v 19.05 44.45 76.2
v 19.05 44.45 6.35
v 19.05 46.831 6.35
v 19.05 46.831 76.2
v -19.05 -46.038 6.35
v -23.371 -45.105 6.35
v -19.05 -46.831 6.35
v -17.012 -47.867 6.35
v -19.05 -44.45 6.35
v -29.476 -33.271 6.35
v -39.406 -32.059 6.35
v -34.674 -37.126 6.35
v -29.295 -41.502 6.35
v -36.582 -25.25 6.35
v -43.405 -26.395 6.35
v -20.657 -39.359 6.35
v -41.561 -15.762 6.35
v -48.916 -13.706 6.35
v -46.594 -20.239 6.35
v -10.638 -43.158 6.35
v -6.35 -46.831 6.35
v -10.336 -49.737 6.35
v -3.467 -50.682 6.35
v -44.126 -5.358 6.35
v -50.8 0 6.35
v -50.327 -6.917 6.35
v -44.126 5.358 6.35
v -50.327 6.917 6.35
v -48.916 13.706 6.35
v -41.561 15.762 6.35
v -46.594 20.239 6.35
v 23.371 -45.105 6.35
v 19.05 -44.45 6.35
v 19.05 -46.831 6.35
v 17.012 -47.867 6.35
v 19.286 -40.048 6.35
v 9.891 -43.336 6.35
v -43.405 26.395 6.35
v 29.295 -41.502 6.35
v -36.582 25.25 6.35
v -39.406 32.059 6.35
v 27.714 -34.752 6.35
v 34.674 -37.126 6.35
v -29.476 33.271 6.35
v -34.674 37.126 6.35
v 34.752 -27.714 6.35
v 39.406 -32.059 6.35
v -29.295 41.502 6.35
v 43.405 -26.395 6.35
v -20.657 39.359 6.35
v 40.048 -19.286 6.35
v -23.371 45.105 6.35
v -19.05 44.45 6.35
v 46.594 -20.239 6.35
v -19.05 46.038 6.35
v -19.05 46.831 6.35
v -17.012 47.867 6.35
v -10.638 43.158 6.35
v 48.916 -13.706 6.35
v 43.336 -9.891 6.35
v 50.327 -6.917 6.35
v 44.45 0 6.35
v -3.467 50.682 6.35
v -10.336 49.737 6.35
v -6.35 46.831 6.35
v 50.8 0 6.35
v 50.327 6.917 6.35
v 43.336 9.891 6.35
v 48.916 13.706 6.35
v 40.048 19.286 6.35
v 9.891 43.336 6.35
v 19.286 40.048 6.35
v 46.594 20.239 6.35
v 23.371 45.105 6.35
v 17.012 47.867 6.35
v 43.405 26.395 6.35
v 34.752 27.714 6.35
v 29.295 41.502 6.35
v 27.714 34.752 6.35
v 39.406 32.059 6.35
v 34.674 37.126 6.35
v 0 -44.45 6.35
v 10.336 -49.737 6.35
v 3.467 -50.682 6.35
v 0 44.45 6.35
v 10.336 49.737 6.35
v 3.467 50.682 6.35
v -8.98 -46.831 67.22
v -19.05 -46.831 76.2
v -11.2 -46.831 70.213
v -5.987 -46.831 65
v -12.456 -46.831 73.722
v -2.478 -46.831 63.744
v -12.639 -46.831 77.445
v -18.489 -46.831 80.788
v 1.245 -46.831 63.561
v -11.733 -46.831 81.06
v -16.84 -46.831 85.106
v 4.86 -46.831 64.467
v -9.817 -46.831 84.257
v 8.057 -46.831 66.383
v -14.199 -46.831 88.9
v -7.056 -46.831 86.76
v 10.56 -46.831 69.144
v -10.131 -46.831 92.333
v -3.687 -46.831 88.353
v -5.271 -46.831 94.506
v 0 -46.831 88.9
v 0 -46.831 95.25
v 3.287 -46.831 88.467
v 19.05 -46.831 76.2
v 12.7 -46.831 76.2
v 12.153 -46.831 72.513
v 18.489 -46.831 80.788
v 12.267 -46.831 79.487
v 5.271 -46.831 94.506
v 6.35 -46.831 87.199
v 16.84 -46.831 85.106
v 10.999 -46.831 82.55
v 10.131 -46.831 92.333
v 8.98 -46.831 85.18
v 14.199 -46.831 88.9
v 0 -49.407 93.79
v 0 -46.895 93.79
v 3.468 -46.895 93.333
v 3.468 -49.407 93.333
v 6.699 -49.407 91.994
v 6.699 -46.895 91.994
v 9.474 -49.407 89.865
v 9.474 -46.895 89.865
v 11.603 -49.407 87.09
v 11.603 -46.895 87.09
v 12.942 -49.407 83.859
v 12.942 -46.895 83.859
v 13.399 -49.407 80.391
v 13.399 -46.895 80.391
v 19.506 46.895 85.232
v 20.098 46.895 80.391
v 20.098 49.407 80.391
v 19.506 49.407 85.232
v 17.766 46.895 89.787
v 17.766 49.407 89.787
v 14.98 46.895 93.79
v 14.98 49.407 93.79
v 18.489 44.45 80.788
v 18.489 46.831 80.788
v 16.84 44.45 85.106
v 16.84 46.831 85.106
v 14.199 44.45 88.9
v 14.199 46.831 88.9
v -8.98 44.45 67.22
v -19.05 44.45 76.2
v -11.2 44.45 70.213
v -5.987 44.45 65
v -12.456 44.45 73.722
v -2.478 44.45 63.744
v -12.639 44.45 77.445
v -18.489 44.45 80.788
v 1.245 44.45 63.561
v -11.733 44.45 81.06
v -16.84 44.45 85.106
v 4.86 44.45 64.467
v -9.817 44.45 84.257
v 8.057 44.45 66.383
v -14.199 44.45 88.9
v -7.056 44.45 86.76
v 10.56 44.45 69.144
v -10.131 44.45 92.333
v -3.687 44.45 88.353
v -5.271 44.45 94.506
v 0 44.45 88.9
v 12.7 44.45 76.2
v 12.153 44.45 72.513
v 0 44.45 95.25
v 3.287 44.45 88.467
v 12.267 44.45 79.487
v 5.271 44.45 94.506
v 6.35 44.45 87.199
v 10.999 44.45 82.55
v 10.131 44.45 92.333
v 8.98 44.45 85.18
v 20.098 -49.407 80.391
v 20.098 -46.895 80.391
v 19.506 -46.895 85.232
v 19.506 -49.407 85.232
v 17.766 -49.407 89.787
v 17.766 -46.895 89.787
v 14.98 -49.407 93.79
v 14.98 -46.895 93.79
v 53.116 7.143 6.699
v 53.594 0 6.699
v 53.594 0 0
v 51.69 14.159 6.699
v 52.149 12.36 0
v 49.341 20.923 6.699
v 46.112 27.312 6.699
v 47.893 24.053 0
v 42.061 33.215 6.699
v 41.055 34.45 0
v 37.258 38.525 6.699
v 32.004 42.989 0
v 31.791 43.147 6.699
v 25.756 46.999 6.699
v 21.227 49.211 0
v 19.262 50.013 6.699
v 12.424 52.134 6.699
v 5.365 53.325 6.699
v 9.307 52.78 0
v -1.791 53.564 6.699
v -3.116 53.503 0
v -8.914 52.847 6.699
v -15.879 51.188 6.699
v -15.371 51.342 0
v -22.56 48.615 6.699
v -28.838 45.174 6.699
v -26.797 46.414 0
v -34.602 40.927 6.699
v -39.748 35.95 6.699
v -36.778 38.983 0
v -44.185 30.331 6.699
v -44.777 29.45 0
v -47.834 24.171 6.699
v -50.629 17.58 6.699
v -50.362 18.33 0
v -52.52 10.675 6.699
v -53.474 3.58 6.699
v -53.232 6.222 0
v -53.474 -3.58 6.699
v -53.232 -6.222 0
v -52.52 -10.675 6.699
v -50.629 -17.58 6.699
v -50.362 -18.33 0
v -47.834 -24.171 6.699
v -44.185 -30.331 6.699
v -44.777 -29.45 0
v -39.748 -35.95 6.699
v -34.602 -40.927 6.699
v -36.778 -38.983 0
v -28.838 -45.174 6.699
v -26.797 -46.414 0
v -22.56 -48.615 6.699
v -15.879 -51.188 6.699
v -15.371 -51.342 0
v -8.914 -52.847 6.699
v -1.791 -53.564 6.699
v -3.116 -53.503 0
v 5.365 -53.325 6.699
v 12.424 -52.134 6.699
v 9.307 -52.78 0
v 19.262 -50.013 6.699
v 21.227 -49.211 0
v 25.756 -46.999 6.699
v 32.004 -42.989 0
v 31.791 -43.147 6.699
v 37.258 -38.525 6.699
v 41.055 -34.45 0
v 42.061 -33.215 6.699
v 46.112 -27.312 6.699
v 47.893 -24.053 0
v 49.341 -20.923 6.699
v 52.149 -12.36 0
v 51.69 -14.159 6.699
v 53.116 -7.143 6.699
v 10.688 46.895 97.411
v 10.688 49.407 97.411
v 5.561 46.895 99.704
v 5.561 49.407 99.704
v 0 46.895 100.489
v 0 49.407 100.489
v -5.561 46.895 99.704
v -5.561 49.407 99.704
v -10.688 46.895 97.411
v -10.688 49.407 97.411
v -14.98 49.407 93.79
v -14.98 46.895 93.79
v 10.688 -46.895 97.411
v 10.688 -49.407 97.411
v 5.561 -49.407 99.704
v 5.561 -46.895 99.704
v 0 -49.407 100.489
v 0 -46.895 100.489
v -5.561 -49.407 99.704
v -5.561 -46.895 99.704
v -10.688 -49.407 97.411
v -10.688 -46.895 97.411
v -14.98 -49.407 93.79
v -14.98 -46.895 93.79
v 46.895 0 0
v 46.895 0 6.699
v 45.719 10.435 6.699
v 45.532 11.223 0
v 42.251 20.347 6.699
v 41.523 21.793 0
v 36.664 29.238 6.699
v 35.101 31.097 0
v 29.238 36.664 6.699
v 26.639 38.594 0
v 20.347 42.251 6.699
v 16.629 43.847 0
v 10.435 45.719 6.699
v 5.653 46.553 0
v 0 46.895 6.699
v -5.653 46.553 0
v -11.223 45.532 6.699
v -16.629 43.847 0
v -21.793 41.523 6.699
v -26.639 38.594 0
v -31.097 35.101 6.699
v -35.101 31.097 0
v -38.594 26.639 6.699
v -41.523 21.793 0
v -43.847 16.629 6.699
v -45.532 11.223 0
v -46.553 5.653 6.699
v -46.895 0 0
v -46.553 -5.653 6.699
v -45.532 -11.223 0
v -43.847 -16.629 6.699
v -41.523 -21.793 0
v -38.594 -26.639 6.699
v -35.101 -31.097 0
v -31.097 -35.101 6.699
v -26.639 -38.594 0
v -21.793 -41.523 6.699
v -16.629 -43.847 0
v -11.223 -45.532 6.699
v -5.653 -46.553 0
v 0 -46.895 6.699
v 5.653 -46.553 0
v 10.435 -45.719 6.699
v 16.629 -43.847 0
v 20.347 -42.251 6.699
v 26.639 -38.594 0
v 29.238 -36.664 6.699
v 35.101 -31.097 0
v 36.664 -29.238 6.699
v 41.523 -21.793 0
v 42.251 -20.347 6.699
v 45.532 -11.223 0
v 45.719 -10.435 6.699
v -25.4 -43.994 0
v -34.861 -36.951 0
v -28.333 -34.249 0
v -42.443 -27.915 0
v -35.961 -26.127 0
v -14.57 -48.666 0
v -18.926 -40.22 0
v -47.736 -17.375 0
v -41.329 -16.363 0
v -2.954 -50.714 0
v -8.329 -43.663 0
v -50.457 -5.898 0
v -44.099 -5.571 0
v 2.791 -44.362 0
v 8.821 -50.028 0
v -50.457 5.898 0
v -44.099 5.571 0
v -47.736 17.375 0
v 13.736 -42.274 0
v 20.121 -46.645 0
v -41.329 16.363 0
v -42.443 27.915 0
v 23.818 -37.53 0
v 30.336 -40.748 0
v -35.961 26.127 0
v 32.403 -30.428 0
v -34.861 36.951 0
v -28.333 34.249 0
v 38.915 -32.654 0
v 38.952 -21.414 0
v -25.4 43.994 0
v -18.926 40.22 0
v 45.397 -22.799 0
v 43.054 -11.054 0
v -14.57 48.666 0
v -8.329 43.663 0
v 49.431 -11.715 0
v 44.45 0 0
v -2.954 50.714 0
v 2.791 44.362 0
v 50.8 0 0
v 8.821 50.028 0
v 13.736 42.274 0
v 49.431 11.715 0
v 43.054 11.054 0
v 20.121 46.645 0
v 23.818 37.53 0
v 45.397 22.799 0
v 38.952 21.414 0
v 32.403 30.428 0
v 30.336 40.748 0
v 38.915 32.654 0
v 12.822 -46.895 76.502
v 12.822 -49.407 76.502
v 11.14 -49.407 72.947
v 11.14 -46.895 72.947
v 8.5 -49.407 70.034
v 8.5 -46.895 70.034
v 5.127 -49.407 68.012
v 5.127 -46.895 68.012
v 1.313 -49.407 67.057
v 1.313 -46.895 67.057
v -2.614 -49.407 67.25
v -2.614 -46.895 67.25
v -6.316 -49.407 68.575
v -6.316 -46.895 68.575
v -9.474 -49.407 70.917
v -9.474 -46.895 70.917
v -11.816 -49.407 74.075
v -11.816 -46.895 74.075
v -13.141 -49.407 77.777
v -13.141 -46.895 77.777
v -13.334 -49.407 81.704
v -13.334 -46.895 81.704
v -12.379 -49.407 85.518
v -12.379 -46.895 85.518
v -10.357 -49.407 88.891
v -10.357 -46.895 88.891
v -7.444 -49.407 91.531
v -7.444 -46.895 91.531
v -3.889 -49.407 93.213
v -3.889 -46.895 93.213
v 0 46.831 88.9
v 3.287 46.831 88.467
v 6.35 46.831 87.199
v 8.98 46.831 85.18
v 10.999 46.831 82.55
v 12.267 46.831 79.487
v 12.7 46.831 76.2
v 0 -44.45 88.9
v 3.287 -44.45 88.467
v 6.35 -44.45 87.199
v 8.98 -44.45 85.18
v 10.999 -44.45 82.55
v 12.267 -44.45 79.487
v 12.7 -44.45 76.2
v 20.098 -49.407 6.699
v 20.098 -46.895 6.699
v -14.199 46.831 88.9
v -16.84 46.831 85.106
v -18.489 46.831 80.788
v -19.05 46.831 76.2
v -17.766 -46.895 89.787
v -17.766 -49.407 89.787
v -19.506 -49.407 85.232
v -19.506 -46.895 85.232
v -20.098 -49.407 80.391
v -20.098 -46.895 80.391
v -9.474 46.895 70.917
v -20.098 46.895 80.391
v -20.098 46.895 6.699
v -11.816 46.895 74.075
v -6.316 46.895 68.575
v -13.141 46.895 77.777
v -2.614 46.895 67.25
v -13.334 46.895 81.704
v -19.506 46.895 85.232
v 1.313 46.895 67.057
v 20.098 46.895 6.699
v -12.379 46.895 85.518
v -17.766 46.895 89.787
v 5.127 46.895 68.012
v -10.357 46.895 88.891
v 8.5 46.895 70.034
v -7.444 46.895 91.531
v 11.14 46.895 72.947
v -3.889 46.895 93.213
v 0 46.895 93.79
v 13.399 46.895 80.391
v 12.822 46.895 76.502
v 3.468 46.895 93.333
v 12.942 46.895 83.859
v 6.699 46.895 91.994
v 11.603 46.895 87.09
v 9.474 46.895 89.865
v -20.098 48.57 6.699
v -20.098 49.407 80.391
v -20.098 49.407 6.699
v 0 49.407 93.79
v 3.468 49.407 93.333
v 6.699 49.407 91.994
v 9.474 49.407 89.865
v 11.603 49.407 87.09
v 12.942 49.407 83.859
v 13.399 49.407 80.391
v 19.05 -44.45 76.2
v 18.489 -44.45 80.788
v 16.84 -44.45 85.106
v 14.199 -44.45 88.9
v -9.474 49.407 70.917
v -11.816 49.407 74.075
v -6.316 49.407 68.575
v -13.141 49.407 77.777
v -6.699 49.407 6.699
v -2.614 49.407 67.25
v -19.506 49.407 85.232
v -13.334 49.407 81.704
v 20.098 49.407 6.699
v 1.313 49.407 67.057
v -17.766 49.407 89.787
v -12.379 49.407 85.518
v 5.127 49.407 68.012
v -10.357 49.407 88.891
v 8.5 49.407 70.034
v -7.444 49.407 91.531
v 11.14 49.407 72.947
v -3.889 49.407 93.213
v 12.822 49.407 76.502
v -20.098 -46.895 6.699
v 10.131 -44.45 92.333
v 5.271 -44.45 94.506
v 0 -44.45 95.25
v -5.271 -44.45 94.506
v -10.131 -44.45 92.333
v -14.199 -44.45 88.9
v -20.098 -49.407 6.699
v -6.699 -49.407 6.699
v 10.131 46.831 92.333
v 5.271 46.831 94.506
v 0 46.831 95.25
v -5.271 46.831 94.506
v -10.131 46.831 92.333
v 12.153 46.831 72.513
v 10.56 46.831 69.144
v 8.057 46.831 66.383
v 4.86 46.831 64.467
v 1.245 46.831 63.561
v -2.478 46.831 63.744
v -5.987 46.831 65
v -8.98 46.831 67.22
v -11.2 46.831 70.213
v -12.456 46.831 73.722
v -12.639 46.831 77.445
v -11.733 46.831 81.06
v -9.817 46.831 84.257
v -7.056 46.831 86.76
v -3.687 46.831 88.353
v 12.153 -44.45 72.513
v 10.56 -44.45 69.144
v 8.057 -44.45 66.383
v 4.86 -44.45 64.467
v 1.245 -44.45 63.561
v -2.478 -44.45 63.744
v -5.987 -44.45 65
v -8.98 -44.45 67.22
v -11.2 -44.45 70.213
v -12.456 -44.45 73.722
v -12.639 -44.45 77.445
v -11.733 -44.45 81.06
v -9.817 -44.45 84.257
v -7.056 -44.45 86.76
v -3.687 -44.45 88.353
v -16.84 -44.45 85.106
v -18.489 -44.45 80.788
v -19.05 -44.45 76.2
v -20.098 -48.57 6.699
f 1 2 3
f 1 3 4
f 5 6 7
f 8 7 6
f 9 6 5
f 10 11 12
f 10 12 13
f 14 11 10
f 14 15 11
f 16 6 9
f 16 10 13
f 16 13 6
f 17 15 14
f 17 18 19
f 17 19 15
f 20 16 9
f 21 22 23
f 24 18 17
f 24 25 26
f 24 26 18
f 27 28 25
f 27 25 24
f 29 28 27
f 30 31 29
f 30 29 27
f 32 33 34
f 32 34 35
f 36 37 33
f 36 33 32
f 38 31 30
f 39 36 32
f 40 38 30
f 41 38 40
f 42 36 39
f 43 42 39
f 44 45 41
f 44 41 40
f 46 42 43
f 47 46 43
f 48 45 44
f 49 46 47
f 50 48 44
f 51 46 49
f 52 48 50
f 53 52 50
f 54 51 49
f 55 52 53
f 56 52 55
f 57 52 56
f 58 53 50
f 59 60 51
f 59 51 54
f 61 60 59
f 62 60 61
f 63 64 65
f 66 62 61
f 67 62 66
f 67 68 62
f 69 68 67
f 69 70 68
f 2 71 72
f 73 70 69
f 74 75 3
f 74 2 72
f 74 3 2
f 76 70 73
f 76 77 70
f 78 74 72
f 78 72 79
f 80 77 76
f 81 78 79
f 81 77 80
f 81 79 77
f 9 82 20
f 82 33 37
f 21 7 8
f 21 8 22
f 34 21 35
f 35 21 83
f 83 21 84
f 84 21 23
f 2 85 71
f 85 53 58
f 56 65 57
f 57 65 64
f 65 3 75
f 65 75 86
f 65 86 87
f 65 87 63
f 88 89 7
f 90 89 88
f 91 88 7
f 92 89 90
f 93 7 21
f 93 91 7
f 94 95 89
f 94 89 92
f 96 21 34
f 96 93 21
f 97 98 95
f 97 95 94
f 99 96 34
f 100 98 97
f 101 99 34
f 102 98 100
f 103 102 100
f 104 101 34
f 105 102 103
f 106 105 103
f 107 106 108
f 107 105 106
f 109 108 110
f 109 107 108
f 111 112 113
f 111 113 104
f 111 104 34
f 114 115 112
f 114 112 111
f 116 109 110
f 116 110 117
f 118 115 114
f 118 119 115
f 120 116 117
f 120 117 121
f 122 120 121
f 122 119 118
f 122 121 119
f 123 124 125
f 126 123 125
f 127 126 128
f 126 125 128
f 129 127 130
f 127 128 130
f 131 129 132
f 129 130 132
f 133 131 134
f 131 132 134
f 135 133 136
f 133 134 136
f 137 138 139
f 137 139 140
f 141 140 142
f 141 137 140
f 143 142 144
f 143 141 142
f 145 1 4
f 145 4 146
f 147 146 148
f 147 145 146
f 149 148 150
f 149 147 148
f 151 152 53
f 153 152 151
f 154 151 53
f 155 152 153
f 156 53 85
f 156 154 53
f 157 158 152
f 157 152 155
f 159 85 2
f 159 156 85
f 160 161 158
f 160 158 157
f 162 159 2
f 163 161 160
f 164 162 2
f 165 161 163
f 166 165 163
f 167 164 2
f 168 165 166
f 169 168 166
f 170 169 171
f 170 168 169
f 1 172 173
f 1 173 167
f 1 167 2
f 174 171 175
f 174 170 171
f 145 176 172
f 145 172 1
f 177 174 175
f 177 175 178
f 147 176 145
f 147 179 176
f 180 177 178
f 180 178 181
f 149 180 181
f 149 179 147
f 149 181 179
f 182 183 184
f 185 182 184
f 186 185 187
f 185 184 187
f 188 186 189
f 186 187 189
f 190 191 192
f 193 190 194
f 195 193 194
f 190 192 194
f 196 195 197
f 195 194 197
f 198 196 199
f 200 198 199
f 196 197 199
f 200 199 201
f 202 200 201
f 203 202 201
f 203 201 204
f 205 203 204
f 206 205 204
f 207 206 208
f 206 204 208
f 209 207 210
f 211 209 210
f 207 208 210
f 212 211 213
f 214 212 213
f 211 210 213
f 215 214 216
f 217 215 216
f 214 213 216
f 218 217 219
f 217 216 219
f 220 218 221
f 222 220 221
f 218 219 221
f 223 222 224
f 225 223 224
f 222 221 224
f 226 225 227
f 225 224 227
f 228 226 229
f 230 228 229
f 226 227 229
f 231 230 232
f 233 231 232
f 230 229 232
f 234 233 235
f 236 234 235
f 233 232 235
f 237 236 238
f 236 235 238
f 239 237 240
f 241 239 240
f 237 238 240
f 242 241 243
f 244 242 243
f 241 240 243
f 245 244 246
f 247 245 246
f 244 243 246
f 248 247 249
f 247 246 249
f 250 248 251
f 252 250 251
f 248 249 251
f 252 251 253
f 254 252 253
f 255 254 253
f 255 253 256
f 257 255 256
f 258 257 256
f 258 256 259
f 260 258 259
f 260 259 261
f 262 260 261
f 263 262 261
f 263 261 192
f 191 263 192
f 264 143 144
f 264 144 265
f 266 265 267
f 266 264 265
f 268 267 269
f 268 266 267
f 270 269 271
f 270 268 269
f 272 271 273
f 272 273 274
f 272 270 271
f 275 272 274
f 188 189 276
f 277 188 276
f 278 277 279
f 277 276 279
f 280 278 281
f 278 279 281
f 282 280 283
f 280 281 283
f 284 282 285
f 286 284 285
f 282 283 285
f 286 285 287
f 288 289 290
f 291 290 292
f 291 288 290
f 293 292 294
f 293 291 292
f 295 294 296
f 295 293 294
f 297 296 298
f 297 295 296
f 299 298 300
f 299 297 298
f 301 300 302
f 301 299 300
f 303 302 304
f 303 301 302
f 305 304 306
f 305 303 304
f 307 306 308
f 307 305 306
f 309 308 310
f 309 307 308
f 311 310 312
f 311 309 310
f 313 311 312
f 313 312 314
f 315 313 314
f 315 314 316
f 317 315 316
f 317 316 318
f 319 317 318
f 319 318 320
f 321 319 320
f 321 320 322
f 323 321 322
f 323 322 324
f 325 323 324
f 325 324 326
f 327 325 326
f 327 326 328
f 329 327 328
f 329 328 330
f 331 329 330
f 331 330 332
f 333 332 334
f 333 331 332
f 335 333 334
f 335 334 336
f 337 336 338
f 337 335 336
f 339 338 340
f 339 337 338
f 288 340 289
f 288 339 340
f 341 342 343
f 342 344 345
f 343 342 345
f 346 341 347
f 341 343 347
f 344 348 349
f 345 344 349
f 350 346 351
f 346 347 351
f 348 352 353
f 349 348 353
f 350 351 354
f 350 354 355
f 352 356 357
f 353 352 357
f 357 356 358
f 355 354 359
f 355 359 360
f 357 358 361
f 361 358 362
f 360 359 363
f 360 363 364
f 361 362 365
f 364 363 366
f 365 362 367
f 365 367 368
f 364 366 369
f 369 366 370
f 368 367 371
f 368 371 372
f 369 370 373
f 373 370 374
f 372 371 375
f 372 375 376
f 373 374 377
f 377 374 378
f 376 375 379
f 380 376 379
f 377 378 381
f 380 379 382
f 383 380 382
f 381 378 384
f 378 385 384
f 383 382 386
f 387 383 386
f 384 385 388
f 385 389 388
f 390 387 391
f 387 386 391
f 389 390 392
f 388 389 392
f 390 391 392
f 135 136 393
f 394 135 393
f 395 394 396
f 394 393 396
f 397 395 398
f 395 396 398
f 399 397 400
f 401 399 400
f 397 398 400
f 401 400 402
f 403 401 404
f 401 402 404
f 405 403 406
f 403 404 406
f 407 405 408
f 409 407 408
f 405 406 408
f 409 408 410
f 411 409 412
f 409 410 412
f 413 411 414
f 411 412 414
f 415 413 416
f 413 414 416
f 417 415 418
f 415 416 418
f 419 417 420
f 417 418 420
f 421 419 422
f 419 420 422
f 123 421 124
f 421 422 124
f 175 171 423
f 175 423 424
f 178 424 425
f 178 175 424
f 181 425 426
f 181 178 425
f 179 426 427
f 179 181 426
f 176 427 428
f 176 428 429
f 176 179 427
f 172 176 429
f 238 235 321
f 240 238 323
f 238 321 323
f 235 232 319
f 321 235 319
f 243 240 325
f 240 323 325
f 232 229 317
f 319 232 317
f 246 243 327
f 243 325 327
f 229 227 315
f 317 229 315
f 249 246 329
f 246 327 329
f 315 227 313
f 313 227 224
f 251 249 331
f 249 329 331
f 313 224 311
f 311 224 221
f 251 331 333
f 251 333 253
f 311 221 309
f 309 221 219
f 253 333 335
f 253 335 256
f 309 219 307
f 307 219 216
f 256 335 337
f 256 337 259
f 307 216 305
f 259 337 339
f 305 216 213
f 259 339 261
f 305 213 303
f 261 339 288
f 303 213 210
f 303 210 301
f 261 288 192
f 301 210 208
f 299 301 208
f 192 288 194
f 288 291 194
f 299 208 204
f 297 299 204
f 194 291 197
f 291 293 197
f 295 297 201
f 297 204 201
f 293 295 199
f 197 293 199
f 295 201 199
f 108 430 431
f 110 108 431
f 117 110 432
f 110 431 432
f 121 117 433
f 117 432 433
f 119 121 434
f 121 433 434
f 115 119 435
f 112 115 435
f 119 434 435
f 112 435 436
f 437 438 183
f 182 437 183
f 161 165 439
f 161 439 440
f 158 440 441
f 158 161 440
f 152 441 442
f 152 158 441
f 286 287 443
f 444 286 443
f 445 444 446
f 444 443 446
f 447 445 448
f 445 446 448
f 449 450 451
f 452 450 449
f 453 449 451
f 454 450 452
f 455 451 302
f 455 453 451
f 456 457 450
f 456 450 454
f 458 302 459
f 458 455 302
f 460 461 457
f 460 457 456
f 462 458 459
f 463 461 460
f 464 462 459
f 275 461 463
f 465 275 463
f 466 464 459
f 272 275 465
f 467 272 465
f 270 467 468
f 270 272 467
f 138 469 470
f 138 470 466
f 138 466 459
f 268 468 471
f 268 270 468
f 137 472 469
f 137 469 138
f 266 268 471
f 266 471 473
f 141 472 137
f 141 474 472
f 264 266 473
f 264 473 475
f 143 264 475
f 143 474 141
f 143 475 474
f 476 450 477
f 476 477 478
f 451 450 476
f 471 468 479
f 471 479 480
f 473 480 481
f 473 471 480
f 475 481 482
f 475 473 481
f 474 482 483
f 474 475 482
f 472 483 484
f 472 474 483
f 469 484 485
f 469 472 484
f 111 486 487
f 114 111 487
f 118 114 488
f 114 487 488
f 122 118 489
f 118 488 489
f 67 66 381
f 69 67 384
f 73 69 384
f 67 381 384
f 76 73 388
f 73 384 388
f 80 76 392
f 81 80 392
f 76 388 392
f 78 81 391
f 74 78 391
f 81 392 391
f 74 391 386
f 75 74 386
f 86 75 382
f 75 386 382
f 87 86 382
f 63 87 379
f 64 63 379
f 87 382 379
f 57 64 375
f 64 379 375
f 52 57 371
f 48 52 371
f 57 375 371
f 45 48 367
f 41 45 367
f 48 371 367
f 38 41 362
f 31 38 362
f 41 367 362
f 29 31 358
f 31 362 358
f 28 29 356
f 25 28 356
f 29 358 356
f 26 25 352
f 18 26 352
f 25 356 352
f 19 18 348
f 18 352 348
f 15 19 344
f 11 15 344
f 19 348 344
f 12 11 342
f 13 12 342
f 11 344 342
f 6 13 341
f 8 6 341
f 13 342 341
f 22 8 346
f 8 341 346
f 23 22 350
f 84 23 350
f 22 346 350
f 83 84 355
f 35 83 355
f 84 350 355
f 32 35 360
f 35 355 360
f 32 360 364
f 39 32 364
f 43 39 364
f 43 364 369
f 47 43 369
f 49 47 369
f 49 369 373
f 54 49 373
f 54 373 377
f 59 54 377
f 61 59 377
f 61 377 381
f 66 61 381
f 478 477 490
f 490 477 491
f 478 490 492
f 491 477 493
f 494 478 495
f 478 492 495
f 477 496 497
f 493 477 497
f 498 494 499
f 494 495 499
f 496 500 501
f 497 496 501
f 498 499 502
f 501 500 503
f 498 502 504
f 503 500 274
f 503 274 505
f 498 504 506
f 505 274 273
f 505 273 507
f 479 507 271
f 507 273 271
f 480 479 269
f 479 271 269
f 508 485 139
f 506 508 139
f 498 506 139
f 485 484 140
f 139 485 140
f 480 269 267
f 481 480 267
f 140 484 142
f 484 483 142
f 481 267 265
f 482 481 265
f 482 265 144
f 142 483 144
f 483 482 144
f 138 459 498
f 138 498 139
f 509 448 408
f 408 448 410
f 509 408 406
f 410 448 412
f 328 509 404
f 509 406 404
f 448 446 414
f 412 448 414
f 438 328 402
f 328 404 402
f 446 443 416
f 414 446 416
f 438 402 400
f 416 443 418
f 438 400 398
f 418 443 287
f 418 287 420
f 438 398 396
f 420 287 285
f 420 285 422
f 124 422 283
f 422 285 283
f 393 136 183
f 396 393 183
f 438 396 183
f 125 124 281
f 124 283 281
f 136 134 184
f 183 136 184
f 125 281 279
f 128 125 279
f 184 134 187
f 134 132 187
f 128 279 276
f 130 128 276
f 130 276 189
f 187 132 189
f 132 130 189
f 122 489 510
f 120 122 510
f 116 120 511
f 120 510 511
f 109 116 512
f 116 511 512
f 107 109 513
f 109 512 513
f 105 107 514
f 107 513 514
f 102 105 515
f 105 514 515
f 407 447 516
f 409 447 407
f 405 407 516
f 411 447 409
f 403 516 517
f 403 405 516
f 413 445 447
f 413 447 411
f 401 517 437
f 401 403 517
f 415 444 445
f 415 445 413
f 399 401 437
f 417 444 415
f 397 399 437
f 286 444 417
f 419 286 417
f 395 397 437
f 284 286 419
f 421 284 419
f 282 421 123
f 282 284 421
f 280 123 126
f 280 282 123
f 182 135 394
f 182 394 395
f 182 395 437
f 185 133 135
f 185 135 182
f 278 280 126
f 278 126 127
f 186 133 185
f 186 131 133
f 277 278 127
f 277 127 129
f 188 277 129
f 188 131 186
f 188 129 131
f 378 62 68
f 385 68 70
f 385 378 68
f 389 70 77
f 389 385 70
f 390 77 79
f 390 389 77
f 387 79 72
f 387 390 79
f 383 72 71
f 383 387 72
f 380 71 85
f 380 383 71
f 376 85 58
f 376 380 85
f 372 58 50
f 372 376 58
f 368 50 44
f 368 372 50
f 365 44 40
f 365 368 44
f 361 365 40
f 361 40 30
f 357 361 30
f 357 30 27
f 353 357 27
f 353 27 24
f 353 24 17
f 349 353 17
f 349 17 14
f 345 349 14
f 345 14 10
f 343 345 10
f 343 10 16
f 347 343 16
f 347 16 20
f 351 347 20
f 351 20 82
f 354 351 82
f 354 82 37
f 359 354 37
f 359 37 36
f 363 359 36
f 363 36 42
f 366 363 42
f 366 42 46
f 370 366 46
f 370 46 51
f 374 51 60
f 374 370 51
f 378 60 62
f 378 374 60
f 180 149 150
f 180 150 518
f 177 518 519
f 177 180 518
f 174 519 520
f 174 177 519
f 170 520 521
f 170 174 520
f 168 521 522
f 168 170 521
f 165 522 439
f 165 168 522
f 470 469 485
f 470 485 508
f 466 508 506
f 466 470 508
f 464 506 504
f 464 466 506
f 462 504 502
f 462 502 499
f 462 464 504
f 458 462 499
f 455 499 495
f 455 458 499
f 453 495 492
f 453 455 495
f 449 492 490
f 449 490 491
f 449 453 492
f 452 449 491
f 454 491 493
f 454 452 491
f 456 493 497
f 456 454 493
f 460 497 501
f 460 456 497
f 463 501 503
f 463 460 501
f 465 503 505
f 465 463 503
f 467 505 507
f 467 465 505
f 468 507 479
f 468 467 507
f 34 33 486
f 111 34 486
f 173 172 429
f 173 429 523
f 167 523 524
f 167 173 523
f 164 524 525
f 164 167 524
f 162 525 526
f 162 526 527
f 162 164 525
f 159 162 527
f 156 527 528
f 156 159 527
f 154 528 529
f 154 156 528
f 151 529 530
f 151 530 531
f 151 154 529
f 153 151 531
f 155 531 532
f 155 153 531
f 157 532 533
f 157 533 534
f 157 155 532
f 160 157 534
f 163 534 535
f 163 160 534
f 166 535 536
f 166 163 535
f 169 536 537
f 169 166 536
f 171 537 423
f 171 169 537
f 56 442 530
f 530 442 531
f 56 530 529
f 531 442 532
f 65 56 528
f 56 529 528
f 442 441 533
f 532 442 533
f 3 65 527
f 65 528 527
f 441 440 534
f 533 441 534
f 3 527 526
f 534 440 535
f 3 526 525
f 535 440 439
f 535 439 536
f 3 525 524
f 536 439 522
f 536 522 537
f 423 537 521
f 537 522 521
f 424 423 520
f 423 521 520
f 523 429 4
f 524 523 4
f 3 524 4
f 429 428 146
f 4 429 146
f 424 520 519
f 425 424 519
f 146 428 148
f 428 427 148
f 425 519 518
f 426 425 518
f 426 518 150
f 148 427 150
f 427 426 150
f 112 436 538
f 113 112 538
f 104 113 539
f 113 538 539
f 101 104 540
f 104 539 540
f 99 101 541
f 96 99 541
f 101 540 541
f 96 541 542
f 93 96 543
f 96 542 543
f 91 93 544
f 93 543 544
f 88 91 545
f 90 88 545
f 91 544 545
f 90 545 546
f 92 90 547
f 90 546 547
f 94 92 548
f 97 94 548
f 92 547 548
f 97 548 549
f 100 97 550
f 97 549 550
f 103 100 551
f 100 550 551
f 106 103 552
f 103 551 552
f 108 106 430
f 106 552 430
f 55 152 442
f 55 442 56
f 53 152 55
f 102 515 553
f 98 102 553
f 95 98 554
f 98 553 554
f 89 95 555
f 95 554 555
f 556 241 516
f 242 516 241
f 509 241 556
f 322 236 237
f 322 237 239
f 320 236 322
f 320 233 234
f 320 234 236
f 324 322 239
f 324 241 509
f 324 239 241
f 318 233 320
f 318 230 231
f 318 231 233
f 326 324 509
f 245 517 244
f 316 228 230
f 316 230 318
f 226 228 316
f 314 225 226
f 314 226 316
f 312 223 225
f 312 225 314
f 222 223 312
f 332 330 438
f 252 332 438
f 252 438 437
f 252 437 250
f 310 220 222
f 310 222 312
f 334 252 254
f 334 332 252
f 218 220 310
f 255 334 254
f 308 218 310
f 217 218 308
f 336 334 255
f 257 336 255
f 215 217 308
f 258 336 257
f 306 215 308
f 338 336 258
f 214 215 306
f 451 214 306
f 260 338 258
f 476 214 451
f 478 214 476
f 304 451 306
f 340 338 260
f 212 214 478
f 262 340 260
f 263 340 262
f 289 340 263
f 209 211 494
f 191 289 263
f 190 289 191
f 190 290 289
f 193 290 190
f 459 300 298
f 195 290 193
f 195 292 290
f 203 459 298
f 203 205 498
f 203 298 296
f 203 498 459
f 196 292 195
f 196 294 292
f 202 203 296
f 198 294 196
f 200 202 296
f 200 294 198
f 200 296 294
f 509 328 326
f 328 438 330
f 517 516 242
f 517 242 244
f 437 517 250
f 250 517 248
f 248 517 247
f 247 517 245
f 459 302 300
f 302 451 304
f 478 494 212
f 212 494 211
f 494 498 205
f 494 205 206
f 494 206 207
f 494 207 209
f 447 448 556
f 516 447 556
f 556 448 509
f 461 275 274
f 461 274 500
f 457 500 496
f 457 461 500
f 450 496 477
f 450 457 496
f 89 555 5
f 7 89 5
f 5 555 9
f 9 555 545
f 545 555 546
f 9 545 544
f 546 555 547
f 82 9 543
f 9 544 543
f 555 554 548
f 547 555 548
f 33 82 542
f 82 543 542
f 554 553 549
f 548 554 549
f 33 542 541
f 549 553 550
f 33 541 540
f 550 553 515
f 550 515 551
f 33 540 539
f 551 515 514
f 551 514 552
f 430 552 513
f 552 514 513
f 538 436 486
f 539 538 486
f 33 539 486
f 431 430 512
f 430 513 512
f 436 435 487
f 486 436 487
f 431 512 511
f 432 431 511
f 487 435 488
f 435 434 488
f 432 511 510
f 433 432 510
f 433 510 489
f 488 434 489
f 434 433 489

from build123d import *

# Parameters (mm, degrees)
F0_R     = 50.8
F0_R_2   = 44.45
F1_DEPTH = 6.35
F4_DEPTH = 2.38125
F6_SCALE = 1.055


with BuildPart() as f1:
    # F0 (on Top) → F1 (new body)
    with BuildSketch(Plane.XY):
        Circle(F0_R)
        Circle(F0_R_2, mode=Mode.SUBTRACT)
    extrude(amount=F1_DEPTH)

    # F3 (on offset) → F4 (join)
    with BuildSketch(Plane.XZ.offset(44.45)):
        with BuildLine():
            Line((-19.05, 76.2), (-19.05, 0))
            Line((-19.05, 0), (19.05, 0))
            Line((19.05, 0), (19.05, 76.2))
            ThreePointArc((19.05, 76.2), (0, 57.15), (-19.05, 76.2))
        make_face()
        with BuildLine():
            ThreePointArc((-14.1990316571, 88.9), (-17.7959834382, 82.9974608102), (-19.05, 76.2))
            ThreePointArc((-19.05, 76.2), (0, 57.15), (19.05, 76.2))
            ThreePointArc((19.05, 76.2), (17.7959834382, 82.9974608102), (14.1990316571, 88.9))
            Line((14.1990316571, 88.9), (-7.87e-08, 88.9))
            Line((-7.87e-08, 88.9), (-14.1990316571, 88.9))
        make_face()
        with BuildLine():
            ThreePointArc((12.7, 76.2), (-8.9802560932, 67.2197438511), (-7.87e-08, 88.9))
            ThreePointArc((-7.87e-08, 88.9), (8.9802560932, 85.1802561489), (12.7, 76.2))
        make_face(mode=Mode.SUBTRACT)
        with BuildLine():
            ThreePointArc((14.1990316571, 88.9), (0, 95.25), (-14.1990316571, 88.9))
            Line((-14.1990316571, 88.9), (-7.87e-08, 88.9))
            Line((-7.87e-08, 88.9), (14.1990316571, 88.9))
        make_face()
    extrude(amount=F4_DEPTH)

    # F5: F1 across plane


with BuildPart() as f1_1:
    add(f1.part)
    add(f1.part.mirror(Plane.XZ))


with BuildPart() as f6_1:
    # F6: copy of F1
    add(f1_1.part.scale(F6_SCALE))


solid = Compound([f1_1.part, f6_1.part])
